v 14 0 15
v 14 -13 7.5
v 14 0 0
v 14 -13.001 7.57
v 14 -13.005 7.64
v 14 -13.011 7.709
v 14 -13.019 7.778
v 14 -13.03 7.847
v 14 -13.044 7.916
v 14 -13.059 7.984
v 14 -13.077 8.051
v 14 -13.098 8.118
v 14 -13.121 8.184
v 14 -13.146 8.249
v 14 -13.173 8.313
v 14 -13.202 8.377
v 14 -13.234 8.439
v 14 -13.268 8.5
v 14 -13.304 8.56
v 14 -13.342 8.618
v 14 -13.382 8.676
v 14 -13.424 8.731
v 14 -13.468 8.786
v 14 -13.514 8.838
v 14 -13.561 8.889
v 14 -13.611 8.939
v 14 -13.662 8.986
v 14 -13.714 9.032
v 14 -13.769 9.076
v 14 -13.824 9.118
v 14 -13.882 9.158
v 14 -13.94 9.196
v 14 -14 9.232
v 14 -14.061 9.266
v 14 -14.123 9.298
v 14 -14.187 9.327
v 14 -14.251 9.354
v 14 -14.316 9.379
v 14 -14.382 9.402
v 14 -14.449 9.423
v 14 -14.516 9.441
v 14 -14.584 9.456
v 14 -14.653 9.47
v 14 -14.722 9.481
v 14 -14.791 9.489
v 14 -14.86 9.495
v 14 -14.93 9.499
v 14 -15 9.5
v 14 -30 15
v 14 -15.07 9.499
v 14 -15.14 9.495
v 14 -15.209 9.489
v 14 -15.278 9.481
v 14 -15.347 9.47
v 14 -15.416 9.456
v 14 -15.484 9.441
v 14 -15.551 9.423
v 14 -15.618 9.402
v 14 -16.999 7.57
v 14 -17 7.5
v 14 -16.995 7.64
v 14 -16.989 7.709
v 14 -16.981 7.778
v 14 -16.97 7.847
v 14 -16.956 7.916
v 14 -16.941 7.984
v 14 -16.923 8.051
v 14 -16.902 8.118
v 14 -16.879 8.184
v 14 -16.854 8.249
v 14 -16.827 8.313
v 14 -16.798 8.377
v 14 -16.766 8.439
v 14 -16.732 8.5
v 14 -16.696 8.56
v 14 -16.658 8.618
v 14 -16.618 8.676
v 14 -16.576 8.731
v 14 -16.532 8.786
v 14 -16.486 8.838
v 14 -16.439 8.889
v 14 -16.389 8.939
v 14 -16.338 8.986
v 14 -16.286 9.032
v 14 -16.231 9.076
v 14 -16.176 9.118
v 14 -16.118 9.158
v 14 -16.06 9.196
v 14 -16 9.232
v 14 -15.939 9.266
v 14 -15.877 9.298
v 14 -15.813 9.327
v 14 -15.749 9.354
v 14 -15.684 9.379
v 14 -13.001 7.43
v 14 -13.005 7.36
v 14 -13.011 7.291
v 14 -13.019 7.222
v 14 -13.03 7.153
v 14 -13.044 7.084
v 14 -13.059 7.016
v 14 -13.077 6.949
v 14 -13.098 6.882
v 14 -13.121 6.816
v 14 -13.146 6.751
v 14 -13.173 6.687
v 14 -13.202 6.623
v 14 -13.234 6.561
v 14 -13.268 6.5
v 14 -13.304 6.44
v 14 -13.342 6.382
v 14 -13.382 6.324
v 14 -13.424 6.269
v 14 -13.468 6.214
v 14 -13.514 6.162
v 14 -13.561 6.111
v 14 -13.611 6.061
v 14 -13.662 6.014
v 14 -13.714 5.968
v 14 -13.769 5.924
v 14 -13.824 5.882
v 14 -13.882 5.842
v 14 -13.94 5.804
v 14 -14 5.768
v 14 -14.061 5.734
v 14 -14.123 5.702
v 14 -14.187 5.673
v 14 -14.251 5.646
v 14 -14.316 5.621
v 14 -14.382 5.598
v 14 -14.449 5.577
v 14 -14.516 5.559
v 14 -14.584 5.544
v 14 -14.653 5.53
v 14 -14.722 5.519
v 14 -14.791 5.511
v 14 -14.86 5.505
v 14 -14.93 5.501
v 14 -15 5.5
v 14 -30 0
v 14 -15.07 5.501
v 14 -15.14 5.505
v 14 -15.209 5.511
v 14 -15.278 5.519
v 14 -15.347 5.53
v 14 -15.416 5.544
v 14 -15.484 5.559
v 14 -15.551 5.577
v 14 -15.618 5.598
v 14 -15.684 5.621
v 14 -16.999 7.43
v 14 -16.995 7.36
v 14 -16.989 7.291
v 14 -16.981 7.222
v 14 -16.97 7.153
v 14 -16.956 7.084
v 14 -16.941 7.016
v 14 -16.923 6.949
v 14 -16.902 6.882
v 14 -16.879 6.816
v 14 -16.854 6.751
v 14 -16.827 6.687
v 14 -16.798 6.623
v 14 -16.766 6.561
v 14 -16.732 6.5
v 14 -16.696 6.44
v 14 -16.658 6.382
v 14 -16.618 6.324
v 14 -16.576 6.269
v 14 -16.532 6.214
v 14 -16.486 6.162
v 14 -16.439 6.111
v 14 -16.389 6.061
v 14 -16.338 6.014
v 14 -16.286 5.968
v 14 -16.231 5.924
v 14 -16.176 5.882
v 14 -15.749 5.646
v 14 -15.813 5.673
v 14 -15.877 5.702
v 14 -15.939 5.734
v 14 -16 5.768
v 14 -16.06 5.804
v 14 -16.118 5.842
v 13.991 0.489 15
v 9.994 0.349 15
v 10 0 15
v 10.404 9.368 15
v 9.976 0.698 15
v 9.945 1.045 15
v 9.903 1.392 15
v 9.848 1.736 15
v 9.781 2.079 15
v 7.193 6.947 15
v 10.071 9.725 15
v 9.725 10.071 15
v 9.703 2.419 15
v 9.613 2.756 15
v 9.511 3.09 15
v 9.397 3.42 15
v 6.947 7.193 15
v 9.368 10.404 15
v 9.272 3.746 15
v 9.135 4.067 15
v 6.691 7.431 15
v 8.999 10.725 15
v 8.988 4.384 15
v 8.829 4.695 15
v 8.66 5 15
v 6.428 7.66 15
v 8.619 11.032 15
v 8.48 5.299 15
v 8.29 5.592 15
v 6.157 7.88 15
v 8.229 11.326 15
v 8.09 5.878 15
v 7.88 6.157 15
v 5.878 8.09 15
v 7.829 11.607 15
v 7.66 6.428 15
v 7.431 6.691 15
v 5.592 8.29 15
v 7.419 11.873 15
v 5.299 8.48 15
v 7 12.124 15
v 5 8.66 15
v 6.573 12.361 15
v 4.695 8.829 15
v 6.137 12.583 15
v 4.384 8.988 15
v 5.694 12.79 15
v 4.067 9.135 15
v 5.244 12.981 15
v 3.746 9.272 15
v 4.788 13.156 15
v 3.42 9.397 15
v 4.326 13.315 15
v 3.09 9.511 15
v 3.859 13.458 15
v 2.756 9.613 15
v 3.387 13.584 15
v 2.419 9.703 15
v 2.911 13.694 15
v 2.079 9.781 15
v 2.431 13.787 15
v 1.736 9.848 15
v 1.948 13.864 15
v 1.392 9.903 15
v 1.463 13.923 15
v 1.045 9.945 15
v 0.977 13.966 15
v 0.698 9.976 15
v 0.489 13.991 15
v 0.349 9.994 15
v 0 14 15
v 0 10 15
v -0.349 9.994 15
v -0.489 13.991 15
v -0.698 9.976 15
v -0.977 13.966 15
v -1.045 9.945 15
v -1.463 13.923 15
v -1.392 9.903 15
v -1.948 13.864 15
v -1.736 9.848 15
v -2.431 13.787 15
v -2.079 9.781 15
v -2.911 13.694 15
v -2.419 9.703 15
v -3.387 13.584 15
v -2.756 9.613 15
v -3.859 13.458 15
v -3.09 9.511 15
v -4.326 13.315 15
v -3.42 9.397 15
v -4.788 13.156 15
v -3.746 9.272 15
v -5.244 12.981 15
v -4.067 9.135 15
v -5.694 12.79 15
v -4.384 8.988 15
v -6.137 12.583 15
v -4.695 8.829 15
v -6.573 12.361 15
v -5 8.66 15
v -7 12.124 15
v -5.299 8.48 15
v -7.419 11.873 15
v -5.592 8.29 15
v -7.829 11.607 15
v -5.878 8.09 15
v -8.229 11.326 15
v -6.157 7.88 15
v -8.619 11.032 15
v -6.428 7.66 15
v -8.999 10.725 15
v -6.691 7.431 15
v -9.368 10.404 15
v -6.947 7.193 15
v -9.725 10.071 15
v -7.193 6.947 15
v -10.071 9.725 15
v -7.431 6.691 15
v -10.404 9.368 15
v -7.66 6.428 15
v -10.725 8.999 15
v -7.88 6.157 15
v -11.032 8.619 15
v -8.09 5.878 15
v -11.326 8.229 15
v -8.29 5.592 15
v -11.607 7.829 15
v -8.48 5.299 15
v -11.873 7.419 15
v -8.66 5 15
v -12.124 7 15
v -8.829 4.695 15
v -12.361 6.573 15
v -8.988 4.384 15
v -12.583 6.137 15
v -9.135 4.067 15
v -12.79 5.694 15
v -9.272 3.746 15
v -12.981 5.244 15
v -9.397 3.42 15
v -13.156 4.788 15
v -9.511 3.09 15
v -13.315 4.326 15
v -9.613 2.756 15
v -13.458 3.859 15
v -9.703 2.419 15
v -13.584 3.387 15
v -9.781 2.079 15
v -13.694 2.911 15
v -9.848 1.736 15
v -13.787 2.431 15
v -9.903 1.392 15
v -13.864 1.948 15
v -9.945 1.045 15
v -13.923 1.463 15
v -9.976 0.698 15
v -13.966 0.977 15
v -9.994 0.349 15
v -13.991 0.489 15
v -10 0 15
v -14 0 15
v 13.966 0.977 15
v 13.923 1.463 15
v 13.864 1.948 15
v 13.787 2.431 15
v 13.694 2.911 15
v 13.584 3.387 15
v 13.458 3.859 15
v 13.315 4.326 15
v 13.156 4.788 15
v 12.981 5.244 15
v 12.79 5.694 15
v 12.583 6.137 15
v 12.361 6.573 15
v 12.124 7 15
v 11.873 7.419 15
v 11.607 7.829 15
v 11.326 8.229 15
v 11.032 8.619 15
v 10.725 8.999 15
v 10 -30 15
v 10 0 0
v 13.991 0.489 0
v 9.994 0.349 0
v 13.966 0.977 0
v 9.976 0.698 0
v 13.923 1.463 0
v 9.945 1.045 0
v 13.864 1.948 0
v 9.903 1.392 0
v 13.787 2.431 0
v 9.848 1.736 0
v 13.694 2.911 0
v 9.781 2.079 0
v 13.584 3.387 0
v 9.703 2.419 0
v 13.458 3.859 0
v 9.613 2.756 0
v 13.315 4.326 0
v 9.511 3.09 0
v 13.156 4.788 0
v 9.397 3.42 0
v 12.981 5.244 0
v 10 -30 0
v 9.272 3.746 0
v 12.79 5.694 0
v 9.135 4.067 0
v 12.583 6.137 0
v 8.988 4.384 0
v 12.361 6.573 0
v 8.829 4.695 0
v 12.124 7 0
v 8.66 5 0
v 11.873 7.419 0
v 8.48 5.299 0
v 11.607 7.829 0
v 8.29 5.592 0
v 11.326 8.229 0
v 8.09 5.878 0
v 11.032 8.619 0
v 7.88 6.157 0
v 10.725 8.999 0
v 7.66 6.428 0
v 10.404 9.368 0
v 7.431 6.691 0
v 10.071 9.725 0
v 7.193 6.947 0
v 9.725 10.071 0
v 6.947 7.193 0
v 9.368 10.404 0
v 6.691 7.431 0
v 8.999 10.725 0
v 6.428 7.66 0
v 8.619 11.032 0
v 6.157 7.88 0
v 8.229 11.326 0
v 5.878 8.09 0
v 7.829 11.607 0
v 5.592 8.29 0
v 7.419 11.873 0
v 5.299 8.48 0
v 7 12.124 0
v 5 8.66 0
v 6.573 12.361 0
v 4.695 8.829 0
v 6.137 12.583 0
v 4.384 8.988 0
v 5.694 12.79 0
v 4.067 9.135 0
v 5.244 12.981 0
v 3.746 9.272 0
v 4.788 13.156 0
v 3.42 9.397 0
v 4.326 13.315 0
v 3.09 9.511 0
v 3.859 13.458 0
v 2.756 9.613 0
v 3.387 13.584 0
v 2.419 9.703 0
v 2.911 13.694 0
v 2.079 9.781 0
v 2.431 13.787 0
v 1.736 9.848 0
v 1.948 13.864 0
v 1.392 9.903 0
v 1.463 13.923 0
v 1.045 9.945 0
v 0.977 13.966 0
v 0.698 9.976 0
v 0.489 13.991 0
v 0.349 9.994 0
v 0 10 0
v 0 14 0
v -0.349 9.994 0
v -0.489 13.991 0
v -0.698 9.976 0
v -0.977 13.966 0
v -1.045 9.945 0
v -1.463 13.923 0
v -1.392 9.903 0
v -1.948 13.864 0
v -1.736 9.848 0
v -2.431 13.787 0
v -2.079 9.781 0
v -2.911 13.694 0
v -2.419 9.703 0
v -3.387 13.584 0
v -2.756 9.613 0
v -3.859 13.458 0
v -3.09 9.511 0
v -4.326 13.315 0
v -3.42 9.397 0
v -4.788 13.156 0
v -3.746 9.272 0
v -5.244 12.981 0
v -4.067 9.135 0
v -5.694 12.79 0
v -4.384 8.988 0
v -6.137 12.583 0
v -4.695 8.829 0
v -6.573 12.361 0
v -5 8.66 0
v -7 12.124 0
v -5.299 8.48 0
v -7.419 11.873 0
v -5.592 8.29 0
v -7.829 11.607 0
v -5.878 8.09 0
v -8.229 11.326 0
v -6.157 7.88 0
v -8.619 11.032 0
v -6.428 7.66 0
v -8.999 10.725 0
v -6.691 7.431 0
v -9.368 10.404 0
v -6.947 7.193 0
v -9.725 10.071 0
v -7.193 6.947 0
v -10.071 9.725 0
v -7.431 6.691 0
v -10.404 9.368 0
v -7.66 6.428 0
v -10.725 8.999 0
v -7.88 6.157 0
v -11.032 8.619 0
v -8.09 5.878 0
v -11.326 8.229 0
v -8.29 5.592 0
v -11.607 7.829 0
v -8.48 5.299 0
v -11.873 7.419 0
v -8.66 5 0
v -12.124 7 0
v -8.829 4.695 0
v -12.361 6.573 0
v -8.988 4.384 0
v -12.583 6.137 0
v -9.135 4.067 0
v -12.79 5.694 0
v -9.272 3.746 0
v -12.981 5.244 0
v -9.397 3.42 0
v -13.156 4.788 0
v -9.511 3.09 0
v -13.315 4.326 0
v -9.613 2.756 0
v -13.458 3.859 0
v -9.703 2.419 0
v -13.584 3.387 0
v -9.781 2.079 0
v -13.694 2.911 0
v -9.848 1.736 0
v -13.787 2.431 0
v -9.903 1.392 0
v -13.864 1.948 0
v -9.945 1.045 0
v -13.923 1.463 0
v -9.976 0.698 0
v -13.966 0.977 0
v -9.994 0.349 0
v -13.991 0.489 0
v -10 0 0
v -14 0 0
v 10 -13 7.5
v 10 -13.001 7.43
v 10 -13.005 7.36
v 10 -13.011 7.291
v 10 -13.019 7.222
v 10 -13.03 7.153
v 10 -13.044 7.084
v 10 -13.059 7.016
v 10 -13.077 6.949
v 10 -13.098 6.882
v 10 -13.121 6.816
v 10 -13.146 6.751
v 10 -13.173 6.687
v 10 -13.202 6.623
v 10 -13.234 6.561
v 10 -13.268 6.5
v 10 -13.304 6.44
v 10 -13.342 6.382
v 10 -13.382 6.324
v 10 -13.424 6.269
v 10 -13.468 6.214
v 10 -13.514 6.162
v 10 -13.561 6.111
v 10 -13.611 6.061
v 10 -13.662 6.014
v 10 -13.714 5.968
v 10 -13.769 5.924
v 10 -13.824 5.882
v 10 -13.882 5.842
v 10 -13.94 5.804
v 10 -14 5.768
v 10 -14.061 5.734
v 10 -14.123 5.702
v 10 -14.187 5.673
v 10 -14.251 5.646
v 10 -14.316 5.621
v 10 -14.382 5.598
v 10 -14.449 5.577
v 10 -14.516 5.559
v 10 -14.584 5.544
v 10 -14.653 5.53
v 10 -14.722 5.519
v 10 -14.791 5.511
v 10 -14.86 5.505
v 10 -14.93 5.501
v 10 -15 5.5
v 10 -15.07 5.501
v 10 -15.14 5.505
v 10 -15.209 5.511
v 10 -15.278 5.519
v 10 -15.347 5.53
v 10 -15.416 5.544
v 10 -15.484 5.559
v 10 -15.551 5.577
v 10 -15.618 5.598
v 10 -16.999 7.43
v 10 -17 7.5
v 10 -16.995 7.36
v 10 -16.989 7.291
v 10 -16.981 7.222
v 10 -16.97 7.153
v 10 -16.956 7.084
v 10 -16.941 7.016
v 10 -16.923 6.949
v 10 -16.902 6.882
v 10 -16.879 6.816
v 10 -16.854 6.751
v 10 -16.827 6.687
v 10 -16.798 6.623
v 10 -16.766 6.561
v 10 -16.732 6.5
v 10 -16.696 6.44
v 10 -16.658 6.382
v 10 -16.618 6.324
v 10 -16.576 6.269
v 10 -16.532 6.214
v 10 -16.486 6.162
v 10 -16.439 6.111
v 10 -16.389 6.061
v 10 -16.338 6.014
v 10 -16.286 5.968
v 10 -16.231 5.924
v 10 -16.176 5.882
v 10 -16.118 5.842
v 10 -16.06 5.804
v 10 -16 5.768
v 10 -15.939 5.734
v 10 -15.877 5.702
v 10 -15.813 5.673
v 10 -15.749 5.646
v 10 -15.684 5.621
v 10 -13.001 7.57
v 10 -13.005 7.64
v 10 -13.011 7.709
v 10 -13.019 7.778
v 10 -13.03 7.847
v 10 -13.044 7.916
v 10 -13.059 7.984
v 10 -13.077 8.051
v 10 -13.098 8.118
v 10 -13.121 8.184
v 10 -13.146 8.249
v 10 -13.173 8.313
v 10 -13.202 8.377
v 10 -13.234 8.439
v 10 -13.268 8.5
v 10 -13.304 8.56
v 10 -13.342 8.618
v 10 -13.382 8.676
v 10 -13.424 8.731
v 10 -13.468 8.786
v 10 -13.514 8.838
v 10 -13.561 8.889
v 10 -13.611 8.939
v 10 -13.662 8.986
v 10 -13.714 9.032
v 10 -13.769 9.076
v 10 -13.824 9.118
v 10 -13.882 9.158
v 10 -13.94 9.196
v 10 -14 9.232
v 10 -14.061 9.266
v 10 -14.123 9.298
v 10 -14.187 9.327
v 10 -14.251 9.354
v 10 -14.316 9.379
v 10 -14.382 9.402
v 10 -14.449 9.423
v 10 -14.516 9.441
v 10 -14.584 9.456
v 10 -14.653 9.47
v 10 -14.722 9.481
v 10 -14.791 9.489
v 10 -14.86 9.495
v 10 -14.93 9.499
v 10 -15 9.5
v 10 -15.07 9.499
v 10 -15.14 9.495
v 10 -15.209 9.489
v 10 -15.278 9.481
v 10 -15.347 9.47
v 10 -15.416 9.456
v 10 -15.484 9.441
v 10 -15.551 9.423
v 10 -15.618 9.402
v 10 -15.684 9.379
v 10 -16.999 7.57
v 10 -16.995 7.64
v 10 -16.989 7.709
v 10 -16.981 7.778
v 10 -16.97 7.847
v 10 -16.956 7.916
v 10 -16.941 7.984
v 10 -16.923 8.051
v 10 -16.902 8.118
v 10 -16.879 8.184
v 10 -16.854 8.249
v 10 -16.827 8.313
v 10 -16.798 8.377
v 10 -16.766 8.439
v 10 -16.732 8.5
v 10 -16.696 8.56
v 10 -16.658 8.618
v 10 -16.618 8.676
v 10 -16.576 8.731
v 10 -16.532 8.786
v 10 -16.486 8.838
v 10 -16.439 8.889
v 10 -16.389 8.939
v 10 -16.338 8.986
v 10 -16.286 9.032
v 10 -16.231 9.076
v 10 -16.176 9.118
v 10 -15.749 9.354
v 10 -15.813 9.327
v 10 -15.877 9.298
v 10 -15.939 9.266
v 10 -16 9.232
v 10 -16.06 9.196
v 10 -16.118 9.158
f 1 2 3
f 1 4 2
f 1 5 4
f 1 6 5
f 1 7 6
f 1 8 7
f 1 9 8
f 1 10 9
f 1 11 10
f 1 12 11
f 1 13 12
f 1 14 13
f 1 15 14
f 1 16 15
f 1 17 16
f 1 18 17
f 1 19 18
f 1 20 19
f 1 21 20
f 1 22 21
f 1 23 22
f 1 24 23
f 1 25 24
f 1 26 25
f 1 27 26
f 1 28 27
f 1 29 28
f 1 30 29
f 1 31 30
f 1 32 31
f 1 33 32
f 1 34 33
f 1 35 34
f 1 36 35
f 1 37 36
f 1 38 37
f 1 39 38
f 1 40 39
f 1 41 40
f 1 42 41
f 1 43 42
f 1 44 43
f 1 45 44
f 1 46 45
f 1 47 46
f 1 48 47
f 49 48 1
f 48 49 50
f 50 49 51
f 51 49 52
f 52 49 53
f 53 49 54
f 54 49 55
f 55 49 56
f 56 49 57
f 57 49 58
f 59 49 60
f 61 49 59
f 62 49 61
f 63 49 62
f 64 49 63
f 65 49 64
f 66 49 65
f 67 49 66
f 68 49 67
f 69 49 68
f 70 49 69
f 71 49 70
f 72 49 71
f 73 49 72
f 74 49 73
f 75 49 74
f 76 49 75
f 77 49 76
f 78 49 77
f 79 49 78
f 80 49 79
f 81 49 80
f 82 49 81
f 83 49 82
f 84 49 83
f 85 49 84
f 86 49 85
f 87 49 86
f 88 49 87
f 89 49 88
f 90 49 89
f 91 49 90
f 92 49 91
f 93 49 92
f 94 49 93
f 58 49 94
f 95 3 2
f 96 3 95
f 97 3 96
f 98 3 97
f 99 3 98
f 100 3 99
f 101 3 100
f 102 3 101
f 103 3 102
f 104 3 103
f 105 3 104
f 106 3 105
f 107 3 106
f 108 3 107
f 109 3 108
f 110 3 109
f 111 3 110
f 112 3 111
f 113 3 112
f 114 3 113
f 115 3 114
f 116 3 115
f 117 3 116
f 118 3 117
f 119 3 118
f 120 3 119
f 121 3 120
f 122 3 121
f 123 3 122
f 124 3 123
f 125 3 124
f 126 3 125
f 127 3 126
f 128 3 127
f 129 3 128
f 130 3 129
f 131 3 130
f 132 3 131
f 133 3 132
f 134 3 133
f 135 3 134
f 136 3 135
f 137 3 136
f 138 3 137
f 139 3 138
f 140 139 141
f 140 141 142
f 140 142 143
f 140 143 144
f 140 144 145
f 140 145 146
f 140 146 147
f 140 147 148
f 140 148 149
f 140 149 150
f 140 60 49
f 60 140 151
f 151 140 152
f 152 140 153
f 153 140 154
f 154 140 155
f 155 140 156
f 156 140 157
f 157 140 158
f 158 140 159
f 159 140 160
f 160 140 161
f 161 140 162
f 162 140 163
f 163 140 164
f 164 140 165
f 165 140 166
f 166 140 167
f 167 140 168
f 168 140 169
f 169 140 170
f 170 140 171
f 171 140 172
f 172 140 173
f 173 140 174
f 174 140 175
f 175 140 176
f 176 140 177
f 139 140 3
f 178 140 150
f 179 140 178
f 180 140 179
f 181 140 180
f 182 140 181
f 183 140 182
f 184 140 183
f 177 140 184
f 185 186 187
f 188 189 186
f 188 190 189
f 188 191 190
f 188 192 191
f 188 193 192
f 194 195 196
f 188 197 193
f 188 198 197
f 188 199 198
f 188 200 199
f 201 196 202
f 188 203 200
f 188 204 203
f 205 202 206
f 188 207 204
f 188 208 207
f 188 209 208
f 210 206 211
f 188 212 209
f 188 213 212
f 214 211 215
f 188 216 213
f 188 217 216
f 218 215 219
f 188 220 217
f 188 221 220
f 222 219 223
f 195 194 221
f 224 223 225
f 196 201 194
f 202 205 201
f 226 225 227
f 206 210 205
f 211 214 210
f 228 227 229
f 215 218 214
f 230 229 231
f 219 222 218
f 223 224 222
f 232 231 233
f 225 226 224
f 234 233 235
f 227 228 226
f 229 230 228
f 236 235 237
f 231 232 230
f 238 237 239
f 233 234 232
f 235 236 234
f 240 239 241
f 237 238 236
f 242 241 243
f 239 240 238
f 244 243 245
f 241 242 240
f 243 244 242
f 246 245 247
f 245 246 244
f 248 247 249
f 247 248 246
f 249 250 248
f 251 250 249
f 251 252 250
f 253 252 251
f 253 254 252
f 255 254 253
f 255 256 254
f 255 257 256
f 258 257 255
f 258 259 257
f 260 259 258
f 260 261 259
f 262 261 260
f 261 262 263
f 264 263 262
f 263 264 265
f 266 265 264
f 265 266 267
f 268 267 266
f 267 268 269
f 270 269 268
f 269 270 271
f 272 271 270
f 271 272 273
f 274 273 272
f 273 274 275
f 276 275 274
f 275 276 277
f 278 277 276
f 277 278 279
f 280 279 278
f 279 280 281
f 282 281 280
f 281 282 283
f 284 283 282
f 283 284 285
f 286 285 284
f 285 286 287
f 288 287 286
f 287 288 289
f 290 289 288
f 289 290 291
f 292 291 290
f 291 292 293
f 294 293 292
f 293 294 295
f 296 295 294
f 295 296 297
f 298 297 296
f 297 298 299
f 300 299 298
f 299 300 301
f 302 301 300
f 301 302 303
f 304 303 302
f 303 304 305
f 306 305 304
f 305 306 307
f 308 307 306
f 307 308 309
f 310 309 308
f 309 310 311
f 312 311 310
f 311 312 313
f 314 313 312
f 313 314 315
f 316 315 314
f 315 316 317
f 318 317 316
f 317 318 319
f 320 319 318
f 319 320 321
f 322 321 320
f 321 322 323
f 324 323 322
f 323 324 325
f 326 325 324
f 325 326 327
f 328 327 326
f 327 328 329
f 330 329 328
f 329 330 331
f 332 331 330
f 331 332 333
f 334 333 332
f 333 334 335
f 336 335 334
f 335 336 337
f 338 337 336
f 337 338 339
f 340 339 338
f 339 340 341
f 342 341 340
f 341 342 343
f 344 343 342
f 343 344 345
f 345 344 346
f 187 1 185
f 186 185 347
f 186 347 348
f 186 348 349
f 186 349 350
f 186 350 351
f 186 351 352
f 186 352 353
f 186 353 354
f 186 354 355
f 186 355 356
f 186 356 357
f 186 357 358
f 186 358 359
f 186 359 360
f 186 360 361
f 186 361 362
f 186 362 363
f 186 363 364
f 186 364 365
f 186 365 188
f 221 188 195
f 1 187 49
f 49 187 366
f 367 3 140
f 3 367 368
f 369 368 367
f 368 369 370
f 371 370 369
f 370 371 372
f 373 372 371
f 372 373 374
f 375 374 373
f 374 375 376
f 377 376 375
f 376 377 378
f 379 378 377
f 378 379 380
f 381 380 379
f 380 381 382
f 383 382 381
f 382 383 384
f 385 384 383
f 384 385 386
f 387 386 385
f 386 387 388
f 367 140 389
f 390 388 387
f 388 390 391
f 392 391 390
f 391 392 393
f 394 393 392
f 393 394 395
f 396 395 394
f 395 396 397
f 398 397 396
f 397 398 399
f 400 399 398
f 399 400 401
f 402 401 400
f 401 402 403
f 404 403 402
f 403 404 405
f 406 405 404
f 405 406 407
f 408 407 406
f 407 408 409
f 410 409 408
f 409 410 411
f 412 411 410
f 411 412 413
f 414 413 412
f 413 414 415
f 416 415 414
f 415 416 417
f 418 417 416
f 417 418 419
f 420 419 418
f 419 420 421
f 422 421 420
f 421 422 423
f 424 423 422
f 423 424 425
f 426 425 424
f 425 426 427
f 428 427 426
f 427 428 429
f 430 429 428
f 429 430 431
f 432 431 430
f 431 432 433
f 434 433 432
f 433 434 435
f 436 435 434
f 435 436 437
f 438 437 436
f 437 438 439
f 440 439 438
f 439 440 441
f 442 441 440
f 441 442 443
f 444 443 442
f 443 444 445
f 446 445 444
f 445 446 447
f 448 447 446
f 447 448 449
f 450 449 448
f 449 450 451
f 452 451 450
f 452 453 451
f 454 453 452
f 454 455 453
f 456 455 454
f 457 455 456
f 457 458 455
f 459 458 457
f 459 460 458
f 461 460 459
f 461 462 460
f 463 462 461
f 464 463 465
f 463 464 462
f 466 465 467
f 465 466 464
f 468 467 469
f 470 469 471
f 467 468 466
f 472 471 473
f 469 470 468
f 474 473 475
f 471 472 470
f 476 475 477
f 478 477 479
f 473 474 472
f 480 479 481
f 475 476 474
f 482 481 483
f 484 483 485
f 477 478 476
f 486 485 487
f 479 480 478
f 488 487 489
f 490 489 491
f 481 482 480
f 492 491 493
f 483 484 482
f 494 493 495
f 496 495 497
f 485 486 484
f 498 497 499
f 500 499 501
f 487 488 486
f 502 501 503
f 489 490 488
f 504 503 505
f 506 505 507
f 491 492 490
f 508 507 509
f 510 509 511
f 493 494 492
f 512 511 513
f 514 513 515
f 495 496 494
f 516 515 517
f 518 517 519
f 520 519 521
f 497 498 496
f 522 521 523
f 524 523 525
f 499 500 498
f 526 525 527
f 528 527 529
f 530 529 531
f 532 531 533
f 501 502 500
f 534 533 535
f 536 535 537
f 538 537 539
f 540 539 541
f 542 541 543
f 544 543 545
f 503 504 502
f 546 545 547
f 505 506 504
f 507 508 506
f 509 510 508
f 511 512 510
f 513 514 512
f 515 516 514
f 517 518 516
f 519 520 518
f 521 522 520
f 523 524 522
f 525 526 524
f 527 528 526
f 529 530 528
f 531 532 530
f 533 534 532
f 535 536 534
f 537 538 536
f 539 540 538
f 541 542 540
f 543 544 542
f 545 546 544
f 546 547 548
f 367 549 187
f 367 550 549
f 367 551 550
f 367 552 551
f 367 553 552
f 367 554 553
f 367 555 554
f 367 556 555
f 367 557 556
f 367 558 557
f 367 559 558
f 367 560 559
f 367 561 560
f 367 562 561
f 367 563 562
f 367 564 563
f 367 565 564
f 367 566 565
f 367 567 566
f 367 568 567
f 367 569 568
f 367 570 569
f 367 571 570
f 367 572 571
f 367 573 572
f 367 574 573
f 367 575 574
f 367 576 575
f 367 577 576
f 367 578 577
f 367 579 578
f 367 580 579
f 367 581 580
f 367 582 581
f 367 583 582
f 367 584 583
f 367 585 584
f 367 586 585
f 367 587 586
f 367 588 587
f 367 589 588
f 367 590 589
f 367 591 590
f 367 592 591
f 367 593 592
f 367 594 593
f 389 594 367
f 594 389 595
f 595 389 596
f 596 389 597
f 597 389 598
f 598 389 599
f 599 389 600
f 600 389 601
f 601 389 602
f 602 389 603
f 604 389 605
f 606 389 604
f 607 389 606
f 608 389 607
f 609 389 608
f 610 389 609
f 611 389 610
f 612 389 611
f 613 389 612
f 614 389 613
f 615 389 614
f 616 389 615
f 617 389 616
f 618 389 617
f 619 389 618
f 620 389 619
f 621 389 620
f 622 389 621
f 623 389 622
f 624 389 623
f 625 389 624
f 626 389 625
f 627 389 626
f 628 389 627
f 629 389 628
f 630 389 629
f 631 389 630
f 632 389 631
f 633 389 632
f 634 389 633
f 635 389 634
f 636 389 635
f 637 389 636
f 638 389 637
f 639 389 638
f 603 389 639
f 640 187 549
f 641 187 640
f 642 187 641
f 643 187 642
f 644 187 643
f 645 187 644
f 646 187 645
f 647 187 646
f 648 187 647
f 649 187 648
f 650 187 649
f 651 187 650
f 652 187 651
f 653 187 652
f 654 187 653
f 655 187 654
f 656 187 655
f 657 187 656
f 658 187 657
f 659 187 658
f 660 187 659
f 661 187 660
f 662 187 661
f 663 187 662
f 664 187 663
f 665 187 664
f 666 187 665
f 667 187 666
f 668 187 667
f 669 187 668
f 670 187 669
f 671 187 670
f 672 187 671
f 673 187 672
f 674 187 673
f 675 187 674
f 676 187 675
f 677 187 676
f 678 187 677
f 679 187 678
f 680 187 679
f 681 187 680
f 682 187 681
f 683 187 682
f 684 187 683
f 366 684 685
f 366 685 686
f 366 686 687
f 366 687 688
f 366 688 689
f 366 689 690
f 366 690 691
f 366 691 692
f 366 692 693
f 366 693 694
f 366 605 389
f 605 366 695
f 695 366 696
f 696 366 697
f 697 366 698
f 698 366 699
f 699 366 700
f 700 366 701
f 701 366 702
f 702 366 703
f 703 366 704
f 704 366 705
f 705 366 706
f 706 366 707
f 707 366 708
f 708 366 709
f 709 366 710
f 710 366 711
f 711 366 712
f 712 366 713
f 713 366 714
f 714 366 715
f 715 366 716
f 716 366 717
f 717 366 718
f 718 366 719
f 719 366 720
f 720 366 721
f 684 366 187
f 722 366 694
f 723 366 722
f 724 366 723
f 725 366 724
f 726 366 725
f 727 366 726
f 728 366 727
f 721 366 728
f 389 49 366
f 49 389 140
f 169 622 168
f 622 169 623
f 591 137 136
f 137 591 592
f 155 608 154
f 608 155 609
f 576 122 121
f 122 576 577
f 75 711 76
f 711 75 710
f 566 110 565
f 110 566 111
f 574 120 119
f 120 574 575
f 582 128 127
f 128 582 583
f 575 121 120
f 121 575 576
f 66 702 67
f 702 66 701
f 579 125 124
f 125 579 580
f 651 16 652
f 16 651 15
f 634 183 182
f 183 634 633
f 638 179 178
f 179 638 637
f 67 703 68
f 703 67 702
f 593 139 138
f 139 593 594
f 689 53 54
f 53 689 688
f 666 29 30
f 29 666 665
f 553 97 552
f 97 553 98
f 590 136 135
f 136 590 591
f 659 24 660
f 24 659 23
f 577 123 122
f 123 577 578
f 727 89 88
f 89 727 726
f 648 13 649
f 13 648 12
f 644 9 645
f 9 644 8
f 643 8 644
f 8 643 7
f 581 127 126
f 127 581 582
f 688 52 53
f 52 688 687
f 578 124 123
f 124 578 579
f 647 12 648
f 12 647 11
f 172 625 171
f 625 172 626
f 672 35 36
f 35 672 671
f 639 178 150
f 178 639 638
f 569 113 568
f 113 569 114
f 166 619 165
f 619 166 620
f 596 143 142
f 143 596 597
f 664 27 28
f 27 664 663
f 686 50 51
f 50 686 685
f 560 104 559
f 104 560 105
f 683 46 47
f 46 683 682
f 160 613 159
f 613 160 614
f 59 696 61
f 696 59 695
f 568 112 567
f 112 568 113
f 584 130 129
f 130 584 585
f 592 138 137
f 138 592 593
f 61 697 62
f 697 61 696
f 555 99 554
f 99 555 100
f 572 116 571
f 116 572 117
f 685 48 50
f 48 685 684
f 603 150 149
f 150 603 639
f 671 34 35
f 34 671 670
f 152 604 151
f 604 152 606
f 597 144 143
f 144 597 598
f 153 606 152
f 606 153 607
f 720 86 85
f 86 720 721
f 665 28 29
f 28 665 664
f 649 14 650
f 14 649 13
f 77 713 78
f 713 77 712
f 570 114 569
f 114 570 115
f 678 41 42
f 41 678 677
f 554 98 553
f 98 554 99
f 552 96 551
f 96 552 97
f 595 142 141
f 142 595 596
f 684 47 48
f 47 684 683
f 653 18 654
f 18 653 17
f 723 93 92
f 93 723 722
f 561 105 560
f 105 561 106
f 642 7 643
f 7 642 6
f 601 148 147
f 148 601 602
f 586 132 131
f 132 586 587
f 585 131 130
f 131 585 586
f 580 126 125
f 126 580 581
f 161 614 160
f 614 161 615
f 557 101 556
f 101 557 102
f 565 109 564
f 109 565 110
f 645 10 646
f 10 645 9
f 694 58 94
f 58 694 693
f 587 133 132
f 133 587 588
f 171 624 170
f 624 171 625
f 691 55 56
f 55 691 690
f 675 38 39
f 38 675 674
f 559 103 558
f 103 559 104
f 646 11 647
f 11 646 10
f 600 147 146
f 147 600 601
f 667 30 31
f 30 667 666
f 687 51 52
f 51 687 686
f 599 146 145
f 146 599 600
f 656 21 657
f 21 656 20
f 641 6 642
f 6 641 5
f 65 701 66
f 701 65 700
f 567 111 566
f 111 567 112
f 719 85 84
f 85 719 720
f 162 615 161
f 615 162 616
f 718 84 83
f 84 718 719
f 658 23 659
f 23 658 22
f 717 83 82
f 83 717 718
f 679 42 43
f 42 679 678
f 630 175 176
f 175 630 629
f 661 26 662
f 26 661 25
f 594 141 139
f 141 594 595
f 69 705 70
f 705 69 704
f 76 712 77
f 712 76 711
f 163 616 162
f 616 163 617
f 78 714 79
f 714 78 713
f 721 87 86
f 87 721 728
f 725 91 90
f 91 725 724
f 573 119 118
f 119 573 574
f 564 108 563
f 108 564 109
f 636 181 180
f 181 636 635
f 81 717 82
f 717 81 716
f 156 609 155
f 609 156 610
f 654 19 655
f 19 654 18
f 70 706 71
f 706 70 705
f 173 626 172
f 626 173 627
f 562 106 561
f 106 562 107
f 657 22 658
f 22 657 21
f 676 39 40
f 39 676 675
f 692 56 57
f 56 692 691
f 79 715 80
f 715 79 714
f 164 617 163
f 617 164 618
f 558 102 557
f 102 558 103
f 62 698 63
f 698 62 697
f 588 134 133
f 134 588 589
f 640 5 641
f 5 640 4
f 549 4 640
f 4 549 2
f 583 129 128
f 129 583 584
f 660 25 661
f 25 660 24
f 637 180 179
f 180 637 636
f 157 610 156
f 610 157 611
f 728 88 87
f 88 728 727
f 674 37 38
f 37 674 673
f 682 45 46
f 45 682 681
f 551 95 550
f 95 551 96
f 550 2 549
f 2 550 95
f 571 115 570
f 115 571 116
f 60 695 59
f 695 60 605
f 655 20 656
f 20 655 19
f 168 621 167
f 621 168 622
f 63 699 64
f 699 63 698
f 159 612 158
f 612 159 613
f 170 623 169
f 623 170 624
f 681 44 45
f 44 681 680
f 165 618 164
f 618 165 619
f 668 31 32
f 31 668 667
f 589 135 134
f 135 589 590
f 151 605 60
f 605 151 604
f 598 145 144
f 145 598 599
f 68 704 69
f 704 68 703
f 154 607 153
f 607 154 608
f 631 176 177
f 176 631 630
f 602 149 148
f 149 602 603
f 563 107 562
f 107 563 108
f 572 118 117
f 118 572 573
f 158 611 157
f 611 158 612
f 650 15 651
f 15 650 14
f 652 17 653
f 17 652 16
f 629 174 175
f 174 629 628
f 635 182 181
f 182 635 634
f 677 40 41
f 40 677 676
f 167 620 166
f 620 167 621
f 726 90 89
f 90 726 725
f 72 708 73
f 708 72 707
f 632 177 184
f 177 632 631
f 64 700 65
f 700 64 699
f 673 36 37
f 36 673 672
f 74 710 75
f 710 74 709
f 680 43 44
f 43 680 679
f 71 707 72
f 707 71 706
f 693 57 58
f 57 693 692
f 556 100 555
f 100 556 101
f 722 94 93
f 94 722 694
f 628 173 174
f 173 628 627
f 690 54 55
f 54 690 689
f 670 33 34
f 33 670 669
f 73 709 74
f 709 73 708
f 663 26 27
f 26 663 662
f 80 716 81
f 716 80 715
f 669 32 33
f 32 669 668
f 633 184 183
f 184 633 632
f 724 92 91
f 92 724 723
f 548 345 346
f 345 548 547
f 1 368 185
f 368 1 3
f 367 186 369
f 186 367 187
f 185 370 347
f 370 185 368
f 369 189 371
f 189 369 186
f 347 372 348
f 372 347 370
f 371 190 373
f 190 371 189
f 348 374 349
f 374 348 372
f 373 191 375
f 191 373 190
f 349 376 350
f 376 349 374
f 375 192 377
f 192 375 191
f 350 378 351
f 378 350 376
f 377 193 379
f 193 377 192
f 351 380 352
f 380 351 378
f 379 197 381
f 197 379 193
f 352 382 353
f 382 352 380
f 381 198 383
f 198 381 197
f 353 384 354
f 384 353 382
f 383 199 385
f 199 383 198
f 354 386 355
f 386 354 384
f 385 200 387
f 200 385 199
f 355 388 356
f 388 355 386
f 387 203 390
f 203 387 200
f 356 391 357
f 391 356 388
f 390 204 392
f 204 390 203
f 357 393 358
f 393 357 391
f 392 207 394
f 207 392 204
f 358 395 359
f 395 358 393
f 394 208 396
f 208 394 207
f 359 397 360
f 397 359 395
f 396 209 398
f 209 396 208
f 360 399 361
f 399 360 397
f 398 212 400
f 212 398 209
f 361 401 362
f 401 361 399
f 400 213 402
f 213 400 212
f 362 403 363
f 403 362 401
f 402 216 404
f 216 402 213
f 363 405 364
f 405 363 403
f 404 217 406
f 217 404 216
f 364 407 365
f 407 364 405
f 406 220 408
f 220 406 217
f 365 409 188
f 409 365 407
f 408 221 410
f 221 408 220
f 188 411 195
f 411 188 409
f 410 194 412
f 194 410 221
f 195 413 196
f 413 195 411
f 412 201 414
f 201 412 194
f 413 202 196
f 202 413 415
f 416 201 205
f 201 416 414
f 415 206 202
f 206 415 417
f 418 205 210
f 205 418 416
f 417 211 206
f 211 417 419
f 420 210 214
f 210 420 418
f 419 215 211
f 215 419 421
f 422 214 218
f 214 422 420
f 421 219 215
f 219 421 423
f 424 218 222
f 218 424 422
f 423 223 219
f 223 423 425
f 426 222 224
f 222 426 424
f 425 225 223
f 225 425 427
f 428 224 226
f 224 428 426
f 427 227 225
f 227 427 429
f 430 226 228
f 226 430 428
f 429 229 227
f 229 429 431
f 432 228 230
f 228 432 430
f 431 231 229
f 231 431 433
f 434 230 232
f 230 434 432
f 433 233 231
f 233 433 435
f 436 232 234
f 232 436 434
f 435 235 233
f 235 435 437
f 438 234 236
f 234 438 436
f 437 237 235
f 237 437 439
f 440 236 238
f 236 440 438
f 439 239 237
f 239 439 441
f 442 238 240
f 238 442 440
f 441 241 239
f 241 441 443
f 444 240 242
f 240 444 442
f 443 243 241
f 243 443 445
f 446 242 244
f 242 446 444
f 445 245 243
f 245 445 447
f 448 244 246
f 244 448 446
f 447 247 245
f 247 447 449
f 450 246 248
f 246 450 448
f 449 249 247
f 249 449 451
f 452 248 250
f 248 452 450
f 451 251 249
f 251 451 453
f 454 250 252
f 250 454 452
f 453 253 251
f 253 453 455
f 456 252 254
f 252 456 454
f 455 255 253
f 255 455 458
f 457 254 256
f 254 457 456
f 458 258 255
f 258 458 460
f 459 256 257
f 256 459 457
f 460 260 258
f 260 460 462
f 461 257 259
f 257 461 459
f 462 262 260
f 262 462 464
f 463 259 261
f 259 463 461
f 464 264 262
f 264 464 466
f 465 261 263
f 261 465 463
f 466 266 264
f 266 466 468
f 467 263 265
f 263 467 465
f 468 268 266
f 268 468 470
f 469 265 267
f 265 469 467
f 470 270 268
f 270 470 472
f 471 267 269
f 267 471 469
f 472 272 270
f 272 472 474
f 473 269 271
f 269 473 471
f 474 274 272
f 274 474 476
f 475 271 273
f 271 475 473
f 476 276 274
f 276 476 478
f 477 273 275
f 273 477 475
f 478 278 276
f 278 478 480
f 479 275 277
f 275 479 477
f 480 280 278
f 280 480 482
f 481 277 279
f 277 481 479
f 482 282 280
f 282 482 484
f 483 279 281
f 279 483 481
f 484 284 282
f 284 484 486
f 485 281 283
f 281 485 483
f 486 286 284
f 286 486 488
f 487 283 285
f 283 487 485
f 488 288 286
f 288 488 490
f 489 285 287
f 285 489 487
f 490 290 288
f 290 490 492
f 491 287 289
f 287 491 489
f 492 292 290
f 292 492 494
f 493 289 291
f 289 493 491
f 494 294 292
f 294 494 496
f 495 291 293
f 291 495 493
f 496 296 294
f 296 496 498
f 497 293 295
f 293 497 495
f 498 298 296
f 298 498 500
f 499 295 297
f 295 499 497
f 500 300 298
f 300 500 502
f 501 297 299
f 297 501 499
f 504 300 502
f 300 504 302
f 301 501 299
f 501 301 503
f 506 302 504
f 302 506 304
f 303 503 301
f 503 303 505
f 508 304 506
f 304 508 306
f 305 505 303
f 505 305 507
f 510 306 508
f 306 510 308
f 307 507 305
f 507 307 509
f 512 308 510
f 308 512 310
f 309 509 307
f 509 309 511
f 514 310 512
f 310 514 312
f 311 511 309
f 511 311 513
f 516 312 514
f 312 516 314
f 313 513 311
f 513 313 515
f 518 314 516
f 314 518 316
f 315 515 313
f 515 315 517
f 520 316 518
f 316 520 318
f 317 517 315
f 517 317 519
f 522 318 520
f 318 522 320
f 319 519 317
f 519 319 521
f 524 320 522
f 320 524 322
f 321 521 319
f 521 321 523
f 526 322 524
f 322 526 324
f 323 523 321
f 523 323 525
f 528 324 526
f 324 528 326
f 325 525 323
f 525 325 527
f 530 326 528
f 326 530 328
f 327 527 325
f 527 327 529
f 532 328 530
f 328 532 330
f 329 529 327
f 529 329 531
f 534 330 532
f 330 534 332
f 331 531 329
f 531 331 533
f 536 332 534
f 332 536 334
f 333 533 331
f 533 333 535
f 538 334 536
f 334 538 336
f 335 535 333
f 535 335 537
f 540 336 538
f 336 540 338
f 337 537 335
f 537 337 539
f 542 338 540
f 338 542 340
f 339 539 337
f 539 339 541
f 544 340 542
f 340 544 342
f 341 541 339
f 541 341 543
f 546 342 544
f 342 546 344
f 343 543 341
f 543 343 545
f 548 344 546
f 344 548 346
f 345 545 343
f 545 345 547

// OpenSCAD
$fn=180;

rotate_extrude(angle=180) {
    translate([10, 0, 0]) {
        square([4, 15]);
    }
}
translate([10, -30, 0]) {
    difference() {
        cube([4, 30, 15]);
        translate([-1, 15, 7.5]) {
            rotate([0, 90, 0]) {
                cylinder(h=6, r=2);
            }
        }
    }
}
